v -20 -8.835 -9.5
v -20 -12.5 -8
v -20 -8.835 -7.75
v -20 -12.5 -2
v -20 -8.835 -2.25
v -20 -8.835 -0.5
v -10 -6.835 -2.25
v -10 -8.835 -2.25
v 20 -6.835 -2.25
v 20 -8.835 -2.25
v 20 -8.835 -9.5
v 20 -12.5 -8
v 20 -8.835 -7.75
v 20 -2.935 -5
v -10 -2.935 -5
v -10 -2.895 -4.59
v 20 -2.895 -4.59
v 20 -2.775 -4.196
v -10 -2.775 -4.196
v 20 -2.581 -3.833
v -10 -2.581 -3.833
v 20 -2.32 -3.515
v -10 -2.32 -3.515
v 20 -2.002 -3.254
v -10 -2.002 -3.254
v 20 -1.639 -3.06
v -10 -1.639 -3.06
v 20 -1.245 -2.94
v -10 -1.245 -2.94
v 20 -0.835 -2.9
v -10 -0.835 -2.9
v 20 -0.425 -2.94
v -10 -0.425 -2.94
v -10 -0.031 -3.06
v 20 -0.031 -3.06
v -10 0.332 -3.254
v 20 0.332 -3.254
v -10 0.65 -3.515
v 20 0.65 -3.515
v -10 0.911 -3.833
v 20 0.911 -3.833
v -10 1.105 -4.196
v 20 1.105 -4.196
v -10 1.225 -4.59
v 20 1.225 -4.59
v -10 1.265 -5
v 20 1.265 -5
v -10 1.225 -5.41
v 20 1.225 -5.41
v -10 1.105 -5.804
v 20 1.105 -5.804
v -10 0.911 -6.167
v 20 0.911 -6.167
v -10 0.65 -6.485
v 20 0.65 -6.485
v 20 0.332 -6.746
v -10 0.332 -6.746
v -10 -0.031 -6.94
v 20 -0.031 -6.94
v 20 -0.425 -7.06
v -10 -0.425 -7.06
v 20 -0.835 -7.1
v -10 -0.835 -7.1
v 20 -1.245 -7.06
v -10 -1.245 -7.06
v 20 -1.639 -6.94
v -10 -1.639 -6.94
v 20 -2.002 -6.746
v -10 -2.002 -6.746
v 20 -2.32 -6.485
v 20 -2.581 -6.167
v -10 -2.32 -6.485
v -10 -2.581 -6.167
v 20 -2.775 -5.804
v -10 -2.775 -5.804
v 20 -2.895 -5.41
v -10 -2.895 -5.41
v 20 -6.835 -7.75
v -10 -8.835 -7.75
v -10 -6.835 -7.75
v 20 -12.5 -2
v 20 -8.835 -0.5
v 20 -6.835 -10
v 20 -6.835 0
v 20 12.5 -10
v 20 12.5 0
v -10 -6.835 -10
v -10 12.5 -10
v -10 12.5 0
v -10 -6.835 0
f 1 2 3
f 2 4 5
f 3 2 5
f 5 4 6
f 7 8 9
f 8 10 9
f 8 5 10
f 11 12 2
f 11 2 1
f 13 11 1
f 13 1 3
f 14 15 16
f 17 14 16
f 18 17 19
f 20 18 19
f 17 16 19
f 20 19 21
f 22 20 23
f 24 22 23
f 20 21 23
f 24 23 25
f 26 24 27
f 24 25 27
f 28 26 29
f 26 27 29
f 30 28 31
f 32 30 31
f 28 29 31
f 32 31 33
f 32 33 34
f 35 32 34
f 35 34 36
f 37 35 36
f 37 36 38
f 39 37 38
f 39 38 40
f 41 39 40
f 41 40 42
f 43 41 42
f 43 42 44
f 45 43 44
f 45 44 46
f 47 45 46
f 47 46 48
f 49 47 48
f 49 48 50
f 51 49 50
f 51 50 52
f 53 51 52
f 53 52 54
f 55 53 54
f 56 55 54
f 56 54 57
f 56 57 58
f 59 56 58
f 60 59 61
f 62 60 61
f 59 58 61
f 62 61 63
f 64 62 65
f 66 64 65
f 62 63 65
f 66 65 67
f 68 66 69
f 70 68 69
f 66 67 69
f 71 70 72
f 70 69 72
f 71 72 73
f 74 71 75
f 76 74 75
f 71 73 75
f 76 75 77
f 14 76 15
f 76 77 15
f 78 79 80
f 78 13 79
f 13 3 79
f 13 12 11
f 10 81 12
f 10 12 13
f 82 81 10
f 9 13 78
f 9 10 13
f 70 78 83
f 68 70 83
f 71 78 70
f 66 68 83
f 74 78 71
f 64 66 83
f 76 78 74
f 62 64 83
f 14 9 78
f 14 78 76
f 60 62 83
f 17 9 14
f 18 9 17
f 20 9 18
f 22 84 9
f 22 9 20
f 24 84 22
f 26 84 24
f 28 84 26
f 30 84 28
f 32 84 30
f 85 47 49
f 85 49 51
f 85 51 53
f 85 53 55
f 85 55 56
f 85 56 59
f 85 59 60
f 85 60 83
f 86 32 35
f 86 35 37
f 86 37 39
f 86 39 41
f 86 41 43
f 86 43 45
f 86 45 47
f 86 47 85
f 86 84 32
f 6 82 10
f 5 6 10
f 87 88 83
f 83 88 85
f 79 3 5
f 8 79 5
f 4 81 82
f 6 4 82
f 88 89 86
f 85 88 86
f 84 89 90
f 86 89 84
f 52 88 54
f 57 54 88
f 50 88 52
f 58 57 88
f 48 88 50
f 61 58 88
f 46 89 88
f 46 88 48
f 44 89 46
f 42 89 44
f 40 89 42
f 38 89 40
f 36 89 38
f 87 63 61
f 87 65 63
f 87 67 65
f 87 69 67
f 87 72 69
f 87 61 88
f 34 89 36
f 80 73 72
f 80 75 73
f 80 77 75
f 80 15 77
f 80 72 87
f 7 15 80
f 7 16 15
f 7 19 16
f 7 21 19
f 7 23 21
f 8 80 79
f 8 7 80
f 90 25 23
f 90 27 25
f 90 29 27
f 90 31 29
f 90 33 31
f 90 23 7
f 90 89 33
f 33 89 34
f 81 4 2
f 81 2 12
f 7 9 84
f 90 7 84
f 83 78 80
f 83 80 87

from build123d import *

# Parameters (mm, degrees)
SKETCH_W        = 40
SKETCH_H        = 25
PAD_DEPTH       = 10
POCKET_DEPTH    = 40.001
SKETCH002_R     = 2.1
POCKET001_DEPTH = 40.001
SKETCH003_W     = 21.335087
SKETCH003_H     = 10
POCKET002_DEPTH = 10


with BuildPart() as part:
    # Sketch → Pad (new body)
    with BuildSketch(Plane.XY):
        Rectangle(SKETCH_W, SKETCH_H)
    extrude(amount=-PAD_DEPTH)

    # Sketch001 → Pocket (cut, through all)
    with BuildSketch(Plane.YZ.offset(20)):
        Polygon((-8.835087, -0.5), (-8.835087, -2.25), (-6.835087, -2.25), (-6.835087, 0), (-12.5, 0), (-12.5, -2), align=None)
        Polygon((-8.835087, -9.5), (-8.835087, -7.75), (-6.835087, -7.75), (-6.835087, -10), (-12.5, -10), (-12.5, -8), align=None)
    extrude(amount=-POCKET_DEPTH, mode=Mode.SUBTRACT)

    # Sketch002 (on Face5 of Pocket) → Pocket001 (cut, through all)
    with BuildSketch(Plane(origin=(-20, 0, 0), x_dir=(0, -1, 0), z_dir=(-1, 0, 0))):
        with Locations((0.835087, -5)):
            Circle(SKETCH002_R)
    extrude(amount=-POCKET001_DEPTH, mode=Mode.SUBTRACT)

    # Sketch003 (on Face5 of Pocket001) → Pocket002 (cut)
    with BuildSketch(Plane(origin=(-20, 0, 0), x_dir=(0, -1, 0), z_dir=(-1, 0, 0))):
        with Locations((-1.832457, -5)):
            Rectangle(SKETCH003_W, SKETCH003_H)
    extrude(amount=-POCKET002_DEPTH, mode=Mode.SUBTRACT)


solid = part.part
